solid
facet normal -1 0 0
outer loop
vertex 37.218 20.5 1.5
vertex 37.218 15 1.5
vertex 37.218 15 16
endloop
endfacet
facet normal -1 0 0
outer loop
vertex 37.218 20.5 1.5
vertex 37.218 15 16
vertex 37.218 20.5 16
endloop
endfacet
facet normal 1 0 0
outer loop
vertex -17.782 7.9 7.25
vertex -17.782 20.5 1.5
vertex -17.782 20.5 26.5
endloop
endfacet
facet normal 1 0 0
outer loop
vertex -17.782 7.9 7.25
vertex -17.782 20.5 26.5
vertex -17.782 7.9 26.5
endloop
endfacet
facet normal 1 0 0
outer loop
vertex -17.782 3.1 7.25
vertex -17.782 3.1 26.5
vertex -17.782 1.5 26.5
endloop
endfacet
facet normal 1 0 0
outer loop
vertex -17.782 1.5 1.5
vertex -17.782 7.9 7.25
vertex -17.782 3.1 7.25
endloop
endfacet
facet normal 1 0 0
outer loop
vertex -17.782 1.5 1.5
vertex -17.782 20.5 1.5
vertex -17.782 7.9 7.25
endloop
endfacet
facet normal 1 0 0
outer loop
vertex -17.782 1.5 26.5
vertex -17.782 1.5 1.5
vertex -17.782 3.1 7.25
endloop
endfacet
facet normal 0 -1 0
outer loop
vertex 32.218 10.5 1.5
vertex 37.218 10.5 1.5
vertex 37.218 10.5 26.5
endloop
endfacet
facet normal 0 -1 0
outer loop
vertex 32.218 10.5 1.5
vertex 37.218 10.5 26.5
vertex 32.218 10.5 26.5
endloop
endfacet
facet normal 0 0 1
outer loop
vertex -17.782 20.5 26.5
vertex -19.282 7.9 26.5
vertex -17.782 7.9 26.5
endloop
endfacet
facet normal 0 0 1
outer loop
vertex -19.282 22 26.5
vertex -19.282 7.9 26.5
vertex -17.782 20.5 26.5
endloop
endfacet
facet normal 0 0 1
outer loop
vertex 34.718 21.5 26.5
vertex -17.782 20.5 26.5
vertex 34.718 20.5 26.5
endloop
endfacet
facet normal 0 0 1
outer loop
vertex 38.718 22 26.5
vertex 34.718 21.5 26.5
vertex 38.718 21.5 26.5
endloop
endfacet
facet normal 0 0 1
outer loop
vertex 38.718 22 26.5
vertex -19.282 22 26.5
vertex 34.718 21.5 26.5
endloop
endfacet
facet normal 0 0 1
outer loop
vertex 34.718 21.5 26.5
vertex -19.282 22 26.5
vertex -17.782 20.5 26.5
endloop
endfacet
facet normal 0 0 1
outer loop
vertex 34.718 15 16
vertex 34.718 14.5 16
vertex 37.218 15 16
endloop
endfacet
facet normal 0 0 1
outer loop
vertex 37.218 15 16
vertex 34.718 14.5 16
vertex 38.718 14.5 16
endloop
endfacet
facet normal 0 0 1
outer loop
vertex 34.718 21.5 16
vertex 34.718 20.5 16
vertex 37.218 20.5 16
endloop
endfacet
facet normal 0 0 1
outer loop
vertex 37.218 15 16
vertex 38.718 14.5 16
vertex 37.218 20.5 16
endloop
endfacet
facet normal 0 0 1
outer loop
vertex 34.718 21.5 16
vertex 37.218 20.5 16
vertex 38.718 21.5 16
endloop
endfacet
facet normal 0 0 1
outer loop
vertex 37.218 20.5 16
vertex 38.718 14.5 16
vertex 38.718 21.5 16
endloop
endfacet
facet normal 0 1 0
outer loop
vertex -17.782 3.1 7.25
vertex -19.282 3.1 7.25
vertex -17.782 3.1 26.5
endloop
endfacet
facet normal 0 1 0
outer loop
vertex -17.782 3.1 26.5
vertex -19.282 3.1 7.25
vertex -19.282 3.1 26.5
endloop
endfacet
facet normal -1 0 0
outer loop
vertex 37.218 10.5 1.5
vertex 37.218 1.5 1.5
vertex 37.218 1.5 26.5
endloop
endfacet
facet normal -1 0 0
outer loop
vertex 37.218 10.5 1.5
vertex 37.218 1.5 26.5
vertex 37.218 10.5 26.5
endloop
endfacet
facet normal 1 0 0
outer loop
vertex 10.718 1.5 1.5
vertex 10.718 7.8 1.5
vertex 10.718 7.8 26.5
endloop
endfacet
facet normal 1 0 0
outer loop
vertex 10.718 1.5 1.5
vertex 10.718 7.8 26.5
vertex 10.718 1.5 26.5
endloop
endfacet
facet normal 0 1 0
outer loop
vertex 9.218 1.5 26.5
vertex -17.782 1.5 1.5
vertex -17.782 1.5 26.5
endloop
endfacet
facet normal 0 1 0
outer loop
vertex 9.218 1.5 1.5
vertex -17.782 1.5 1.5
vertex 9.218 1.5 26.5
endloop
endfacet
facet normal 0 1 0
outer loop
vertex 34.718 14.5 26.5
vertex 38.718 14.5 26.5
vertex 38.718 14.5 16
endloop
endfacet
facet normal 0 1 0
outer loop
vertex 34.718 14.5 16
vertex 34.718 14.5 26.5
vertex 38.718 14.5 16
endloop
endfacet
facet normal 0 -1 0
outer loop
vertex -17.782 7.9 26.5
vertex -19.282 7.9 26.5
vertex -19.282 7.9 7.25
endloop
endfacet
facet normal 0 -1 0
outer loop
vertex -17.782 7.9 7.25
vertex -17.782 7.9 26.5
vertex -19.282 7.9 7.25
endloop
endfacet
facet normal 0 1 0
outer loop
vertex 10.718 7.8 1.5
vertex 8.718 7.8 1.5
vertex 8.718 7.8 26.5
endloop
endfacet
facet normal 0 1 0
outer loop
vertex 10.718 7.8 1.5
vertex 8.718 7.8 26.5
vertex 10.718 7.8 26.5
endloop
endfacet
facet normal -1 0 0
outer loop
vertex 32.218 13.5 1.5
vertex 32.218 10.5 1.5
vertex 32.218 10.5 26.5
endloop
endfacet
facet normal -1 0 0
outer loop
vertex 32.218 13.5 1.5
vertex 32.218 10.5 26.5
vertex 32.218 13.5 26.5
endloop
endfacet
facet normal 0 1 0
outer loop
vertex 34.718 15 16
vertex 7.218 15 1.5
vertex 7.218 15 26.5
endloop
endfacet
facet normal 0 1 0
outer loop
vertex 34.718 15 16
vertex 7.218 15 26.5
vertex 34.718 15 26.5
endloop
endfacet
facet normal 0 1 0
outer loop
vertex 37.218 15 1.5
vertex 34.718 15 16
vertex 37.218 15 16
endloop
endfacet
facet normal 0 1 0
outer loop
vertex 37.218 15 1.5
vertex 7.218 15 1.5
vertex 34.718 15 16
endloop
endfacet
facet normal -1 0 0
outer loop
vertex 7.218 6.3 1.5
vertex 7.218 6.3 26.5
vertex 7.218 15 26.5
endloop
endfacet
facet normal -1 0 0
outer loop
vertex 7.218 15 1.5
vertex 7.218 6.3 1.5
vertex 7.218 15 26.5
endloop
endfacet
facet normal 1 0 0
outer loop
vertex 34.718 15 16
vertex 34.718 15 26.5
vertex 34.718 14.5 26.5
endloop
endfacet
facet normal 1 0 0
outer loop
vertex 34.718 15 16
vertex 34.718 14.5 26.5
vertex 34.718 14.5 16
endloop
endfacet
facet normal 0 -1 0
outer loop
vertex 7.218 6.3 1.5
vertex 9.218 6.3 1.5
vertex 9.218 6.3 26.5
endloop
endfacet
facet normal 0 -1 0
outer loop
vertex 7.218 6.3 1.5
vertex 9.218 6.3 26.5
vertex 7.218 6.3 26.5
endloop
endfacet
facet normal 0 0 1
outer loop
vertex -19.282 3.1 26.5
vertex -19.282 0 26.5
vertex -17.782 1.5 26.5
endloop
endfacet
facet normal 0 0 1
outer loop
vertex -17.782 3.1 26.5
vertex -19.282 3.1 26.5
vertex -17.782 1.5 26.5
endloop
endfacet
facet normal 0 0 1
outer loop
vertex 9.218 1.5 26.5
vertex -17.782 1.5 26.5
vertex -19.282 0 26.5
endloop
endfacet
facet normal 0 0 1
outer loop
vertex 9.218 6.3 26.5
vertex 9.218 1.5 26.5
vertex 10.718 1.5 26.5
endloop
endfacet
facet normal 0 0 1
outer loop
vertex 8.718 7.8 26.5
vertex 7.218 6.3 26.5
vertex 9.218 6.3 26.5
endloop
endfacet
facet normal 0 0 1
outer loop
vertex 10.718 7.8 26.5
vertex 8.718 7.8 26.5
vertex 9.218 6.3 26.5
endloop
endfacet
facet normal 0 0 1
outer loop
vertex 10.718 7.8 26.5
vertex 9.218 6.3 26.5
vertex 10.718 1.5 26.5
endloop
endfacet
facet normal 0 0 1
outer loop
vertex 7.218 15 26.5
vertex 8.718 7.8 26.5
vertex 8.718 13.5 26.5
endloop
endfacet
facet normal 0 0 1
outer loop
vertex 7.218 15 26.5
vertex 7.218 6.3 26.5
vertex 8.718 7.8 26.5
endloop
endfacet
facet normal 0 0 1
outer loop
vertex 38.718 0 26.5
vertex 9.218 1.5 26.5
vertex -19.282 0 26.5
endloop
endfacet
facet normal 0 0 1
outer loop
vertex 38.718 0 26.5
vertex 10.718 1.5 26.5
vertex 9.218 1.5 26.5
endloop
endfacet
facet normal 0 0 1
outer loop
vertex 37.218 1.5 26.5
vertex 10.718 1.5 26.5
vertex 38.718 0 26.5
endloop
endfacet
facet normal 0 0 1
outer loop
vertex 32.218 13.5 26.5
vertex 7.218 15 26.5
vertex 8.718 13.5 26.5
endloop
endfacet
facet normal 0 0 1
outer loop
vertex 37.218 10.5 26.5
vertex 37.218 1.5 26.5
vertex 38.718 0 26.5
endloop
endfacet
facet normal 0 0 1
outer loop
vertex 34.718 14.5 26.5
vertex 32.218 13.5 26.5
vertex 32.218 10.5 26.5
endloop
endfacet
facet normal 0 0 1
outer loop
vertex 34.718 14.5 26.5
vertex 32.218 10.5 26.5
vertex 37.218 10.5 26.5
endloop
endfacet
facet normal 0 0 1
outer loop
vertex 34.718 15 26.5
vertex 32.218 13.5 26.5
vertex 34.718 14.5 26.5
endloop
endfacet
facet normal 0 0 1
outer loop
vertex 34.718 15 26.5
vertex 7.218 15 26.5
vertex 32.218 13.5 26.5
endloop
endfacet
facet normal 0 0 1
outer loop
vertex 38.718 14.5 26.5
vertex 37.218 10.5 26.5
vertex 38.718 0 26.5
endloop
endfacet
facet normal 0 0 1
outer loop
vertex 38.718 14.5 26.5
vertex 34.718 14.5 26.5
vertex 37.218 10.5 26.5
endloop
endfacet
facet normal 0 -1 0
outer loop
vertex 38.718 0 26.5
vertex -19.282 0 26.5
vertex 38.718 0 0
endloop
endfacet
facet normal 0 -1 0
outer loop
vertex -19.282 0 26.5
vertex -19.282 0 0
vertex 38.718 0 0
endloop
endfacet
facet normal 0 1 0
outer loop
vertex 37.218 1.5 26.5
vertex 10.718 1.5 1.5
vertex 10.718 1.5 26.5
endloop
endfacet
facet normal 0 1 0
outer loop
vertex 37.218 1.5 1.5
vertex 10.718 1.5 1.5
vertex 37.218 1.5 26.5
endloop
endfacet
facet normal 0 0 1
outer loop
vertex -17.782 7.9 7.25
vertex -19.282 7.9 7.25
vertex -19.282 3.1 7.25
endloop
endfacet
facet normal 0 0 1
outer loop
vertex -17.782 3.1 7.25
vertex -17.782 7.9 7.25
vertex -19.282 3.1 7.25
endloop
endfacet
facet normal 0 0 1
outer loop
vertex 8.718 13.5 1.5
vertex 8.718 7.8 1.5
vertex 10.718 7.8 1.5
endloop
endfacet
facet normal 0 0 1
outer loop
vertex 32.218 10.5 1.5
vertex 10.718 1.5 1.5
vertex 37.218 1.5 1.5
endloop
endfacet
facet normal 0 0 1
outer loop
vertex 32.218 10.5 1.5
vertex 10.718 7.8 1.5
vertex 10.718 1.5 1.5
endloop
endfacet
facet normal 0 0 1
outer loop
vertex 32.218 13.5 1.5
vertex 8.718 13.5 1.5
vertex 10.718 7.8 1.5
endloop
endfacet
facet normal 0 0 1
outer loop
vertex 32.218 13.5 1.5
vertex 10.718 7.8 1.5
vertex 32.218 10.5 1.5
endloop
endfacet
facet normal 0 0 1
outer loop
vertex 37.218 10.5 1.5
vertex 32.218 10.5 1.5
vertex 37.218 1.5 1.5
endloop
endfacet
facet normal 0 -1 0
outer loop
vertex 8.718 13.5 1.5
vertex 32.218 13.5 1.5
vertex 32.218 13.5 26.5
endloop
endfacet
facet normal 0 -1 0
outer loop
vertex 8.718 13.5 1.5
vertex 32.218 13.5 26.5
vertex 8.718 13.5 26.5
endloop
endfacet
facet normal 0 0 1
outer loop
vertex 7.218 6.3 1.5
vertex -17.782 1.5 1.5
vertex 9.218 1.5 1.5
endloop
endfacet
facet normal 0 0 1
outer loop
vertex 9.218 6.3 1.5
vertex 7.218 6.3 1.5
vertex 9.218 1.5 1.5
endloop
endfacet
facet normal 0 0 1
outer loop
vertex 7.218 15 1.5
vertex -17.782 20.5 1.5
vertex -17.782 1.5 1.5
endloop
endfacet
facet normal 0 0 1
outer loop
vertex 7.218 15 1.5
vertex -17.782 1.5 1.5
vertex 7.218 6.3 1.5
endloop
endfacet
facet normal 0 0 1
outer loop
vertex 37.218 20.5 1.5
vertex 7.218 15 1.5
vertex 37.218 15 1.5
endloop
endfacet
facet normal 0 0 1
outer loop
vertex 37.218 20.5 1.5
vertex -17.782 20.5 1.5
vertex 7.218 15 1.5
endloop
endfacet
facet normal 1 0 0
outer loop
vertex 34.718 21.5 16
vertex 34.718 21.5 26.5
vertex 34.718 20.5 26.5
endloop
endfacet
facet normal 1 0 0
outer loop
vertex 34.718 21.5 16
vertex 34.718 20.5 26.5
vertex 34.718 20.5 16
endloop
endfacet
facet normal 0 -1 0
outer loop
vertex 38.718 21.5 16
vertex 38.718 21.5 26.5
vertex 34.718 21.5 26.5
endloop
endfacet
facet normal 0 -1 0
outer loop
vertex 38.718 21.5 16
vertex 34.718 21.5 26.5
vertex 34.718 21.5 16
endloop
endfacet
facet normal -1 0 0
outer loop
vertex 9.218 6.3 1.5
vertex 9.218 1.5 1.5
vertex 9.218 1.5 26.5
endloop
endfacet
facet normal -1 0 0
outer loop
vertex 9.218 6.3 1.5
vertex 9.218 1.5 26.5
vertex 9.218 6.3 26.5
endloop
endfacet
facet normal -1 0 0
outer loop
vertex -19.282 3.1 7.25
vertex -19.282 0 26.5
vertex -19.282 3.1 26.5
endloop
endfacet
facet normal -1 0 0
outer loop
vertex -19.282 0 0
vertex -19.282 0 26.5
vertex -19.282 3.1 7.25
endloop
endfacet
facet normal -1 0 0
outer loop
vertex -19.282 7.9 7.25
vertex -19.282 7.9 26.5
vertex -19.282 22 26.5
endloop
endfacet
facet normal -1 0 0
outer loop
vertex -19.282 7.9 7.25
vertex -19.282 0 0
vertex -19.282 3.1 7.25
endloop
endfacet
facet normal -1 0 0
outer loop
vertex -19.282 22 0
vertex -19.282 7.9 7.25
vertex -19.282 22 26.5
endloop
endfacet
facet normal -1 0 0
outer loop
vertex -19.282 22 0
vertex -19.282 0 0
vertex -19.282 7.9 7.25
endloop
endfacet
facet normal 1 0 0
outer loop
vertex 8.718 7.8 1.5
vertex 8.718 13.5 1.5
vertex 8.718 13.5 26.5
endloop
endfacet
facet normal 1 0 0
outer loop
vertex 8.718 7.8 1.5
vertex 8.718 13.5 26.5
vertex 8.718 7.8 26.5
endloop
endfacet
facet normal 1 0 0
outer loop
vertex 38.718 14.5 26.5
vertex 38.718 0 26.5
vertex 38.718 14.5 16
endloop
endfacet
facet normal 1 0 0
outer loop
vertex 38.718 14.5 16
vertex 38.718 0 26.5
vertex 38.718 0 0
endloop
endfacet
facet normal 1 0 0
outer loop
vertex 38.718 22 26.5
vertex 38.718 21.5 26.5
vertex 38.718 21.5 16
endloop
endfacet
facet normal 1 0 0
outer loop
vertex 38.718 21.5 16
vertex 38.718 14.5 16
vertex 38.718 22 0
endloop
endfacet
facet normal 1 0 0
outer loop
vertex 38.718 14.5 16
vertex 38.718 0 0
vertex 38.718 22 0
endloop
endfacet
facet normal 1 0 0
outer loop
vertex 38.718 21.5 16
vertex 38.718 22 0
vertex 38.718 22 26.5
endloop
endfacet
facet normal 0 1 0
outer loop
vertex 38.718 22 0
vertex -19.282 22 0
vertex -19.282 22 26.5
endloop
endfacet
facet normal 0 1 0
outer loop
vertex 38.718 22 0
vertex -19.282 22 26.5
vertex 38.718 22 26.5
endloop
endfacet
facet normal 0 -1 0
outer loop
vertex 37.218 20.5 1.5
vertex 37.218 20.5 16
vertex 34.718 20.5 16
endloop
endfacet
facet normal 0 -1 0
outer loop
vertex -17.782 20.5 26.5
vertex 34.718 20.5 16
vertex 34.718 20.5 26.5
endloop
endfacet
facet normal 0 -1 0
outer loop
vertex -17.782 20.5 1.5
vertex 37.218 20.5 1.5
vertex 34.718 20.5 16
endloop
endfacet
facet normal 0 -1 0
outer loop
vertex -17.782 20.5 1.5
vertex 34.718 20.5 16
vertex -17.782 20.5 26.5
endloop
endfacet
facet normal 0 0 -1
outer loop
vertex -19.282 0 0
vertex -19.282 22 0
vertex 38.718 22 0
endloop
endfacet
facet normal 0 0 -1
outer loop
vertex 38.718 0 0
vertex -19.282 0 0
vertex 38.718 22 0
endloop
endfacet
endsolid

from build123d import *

# Parameters (mm, degrees)
SKETCH1_W           = 58
SKETCH1_H           = 22
BOSS_EXTRUDE1_DEPTH = 1.5
SKETCH2_W           = 58
SKETCH2_H           = 22
BOSS_EXTRUDE2_DEPTH = 25
CUT_EXTRUDE1_DEPTH  = 5
SKETCH6_W           = 10.5
SKETCH6_H           = 7
CUT_EXTRUDE2_DEPTH  = 4


with BuildPart() as part:
    # Sketch1 → Boss-Extrude1 (new body)
    with BuildSketch(Plane.XY):
        with Locations((9.718487395, 11)):
            Rectangle(SKETCH1_W, SKETCH1_H)
    extrude(amount=BOSS_EXTRUDE1_DEPTH)

    # Sketch2 → Boss-Extrude2 (add)
    with BuildSketch(Plane.XY.offset(1.5)):
        with Locations((9.718487395, 11)):
            Rectangle(SKETCH2_W, SKETCH2_H)
        Polygon((-17.781512605, 20.5), (-17.781512605, 1.5), (9.218487395, 1.5), (9.218487395, 6.3), (7.218487395, 6.3), (7.218487395, 15), (37.218487395, 15), (37.218487395, 20.5), align=None, mode=Mode.SUBTRACT)
        Polygon((37.218487395, 1.5), (37.218487395, 10.5), (32.218487395, 10.5), (32.218487395, 13.5), (8.718487395, 13.5), (8.718487395, 7.8), (10.718487395, 7.8), (10.718487395, 1.5), align=None, mode=Mode.SUBTRACT)
    extrude(amount=BOSS_EXTRUDE2_DEPTH)

    # Sketch3 → Cut-Extrude1 (cut)
    with BuildSketch(Plane.ZY.offset(19.281512605)):
        Polygon((7.25, 3.1), (19.25, 3.1), (26.5, 3.1), (26.5, 7.9), (19.25, 7.9), (7.25, 7.9), align=None)
    extrude(amount=-CUT_EXTRUDE1_DEPTH, mode=Mode.SUBTRACT)

    # Sketch6 → Cut-Extrude2 (cut)
    with BuildSketch(Plane(origin=(38.718487395, 0, 0), x_dir=(0, 0, -1), z_dir=(1, 0, 0))):
        with Locations((-21.25, 18)):
            Rectangle(SKETCH6_W, SKETCH6_H)
    extrude(amount=-CUT_EXTRUDE2_DEPTH, mode=Mode.SUBTRACT)


solid = part.part
